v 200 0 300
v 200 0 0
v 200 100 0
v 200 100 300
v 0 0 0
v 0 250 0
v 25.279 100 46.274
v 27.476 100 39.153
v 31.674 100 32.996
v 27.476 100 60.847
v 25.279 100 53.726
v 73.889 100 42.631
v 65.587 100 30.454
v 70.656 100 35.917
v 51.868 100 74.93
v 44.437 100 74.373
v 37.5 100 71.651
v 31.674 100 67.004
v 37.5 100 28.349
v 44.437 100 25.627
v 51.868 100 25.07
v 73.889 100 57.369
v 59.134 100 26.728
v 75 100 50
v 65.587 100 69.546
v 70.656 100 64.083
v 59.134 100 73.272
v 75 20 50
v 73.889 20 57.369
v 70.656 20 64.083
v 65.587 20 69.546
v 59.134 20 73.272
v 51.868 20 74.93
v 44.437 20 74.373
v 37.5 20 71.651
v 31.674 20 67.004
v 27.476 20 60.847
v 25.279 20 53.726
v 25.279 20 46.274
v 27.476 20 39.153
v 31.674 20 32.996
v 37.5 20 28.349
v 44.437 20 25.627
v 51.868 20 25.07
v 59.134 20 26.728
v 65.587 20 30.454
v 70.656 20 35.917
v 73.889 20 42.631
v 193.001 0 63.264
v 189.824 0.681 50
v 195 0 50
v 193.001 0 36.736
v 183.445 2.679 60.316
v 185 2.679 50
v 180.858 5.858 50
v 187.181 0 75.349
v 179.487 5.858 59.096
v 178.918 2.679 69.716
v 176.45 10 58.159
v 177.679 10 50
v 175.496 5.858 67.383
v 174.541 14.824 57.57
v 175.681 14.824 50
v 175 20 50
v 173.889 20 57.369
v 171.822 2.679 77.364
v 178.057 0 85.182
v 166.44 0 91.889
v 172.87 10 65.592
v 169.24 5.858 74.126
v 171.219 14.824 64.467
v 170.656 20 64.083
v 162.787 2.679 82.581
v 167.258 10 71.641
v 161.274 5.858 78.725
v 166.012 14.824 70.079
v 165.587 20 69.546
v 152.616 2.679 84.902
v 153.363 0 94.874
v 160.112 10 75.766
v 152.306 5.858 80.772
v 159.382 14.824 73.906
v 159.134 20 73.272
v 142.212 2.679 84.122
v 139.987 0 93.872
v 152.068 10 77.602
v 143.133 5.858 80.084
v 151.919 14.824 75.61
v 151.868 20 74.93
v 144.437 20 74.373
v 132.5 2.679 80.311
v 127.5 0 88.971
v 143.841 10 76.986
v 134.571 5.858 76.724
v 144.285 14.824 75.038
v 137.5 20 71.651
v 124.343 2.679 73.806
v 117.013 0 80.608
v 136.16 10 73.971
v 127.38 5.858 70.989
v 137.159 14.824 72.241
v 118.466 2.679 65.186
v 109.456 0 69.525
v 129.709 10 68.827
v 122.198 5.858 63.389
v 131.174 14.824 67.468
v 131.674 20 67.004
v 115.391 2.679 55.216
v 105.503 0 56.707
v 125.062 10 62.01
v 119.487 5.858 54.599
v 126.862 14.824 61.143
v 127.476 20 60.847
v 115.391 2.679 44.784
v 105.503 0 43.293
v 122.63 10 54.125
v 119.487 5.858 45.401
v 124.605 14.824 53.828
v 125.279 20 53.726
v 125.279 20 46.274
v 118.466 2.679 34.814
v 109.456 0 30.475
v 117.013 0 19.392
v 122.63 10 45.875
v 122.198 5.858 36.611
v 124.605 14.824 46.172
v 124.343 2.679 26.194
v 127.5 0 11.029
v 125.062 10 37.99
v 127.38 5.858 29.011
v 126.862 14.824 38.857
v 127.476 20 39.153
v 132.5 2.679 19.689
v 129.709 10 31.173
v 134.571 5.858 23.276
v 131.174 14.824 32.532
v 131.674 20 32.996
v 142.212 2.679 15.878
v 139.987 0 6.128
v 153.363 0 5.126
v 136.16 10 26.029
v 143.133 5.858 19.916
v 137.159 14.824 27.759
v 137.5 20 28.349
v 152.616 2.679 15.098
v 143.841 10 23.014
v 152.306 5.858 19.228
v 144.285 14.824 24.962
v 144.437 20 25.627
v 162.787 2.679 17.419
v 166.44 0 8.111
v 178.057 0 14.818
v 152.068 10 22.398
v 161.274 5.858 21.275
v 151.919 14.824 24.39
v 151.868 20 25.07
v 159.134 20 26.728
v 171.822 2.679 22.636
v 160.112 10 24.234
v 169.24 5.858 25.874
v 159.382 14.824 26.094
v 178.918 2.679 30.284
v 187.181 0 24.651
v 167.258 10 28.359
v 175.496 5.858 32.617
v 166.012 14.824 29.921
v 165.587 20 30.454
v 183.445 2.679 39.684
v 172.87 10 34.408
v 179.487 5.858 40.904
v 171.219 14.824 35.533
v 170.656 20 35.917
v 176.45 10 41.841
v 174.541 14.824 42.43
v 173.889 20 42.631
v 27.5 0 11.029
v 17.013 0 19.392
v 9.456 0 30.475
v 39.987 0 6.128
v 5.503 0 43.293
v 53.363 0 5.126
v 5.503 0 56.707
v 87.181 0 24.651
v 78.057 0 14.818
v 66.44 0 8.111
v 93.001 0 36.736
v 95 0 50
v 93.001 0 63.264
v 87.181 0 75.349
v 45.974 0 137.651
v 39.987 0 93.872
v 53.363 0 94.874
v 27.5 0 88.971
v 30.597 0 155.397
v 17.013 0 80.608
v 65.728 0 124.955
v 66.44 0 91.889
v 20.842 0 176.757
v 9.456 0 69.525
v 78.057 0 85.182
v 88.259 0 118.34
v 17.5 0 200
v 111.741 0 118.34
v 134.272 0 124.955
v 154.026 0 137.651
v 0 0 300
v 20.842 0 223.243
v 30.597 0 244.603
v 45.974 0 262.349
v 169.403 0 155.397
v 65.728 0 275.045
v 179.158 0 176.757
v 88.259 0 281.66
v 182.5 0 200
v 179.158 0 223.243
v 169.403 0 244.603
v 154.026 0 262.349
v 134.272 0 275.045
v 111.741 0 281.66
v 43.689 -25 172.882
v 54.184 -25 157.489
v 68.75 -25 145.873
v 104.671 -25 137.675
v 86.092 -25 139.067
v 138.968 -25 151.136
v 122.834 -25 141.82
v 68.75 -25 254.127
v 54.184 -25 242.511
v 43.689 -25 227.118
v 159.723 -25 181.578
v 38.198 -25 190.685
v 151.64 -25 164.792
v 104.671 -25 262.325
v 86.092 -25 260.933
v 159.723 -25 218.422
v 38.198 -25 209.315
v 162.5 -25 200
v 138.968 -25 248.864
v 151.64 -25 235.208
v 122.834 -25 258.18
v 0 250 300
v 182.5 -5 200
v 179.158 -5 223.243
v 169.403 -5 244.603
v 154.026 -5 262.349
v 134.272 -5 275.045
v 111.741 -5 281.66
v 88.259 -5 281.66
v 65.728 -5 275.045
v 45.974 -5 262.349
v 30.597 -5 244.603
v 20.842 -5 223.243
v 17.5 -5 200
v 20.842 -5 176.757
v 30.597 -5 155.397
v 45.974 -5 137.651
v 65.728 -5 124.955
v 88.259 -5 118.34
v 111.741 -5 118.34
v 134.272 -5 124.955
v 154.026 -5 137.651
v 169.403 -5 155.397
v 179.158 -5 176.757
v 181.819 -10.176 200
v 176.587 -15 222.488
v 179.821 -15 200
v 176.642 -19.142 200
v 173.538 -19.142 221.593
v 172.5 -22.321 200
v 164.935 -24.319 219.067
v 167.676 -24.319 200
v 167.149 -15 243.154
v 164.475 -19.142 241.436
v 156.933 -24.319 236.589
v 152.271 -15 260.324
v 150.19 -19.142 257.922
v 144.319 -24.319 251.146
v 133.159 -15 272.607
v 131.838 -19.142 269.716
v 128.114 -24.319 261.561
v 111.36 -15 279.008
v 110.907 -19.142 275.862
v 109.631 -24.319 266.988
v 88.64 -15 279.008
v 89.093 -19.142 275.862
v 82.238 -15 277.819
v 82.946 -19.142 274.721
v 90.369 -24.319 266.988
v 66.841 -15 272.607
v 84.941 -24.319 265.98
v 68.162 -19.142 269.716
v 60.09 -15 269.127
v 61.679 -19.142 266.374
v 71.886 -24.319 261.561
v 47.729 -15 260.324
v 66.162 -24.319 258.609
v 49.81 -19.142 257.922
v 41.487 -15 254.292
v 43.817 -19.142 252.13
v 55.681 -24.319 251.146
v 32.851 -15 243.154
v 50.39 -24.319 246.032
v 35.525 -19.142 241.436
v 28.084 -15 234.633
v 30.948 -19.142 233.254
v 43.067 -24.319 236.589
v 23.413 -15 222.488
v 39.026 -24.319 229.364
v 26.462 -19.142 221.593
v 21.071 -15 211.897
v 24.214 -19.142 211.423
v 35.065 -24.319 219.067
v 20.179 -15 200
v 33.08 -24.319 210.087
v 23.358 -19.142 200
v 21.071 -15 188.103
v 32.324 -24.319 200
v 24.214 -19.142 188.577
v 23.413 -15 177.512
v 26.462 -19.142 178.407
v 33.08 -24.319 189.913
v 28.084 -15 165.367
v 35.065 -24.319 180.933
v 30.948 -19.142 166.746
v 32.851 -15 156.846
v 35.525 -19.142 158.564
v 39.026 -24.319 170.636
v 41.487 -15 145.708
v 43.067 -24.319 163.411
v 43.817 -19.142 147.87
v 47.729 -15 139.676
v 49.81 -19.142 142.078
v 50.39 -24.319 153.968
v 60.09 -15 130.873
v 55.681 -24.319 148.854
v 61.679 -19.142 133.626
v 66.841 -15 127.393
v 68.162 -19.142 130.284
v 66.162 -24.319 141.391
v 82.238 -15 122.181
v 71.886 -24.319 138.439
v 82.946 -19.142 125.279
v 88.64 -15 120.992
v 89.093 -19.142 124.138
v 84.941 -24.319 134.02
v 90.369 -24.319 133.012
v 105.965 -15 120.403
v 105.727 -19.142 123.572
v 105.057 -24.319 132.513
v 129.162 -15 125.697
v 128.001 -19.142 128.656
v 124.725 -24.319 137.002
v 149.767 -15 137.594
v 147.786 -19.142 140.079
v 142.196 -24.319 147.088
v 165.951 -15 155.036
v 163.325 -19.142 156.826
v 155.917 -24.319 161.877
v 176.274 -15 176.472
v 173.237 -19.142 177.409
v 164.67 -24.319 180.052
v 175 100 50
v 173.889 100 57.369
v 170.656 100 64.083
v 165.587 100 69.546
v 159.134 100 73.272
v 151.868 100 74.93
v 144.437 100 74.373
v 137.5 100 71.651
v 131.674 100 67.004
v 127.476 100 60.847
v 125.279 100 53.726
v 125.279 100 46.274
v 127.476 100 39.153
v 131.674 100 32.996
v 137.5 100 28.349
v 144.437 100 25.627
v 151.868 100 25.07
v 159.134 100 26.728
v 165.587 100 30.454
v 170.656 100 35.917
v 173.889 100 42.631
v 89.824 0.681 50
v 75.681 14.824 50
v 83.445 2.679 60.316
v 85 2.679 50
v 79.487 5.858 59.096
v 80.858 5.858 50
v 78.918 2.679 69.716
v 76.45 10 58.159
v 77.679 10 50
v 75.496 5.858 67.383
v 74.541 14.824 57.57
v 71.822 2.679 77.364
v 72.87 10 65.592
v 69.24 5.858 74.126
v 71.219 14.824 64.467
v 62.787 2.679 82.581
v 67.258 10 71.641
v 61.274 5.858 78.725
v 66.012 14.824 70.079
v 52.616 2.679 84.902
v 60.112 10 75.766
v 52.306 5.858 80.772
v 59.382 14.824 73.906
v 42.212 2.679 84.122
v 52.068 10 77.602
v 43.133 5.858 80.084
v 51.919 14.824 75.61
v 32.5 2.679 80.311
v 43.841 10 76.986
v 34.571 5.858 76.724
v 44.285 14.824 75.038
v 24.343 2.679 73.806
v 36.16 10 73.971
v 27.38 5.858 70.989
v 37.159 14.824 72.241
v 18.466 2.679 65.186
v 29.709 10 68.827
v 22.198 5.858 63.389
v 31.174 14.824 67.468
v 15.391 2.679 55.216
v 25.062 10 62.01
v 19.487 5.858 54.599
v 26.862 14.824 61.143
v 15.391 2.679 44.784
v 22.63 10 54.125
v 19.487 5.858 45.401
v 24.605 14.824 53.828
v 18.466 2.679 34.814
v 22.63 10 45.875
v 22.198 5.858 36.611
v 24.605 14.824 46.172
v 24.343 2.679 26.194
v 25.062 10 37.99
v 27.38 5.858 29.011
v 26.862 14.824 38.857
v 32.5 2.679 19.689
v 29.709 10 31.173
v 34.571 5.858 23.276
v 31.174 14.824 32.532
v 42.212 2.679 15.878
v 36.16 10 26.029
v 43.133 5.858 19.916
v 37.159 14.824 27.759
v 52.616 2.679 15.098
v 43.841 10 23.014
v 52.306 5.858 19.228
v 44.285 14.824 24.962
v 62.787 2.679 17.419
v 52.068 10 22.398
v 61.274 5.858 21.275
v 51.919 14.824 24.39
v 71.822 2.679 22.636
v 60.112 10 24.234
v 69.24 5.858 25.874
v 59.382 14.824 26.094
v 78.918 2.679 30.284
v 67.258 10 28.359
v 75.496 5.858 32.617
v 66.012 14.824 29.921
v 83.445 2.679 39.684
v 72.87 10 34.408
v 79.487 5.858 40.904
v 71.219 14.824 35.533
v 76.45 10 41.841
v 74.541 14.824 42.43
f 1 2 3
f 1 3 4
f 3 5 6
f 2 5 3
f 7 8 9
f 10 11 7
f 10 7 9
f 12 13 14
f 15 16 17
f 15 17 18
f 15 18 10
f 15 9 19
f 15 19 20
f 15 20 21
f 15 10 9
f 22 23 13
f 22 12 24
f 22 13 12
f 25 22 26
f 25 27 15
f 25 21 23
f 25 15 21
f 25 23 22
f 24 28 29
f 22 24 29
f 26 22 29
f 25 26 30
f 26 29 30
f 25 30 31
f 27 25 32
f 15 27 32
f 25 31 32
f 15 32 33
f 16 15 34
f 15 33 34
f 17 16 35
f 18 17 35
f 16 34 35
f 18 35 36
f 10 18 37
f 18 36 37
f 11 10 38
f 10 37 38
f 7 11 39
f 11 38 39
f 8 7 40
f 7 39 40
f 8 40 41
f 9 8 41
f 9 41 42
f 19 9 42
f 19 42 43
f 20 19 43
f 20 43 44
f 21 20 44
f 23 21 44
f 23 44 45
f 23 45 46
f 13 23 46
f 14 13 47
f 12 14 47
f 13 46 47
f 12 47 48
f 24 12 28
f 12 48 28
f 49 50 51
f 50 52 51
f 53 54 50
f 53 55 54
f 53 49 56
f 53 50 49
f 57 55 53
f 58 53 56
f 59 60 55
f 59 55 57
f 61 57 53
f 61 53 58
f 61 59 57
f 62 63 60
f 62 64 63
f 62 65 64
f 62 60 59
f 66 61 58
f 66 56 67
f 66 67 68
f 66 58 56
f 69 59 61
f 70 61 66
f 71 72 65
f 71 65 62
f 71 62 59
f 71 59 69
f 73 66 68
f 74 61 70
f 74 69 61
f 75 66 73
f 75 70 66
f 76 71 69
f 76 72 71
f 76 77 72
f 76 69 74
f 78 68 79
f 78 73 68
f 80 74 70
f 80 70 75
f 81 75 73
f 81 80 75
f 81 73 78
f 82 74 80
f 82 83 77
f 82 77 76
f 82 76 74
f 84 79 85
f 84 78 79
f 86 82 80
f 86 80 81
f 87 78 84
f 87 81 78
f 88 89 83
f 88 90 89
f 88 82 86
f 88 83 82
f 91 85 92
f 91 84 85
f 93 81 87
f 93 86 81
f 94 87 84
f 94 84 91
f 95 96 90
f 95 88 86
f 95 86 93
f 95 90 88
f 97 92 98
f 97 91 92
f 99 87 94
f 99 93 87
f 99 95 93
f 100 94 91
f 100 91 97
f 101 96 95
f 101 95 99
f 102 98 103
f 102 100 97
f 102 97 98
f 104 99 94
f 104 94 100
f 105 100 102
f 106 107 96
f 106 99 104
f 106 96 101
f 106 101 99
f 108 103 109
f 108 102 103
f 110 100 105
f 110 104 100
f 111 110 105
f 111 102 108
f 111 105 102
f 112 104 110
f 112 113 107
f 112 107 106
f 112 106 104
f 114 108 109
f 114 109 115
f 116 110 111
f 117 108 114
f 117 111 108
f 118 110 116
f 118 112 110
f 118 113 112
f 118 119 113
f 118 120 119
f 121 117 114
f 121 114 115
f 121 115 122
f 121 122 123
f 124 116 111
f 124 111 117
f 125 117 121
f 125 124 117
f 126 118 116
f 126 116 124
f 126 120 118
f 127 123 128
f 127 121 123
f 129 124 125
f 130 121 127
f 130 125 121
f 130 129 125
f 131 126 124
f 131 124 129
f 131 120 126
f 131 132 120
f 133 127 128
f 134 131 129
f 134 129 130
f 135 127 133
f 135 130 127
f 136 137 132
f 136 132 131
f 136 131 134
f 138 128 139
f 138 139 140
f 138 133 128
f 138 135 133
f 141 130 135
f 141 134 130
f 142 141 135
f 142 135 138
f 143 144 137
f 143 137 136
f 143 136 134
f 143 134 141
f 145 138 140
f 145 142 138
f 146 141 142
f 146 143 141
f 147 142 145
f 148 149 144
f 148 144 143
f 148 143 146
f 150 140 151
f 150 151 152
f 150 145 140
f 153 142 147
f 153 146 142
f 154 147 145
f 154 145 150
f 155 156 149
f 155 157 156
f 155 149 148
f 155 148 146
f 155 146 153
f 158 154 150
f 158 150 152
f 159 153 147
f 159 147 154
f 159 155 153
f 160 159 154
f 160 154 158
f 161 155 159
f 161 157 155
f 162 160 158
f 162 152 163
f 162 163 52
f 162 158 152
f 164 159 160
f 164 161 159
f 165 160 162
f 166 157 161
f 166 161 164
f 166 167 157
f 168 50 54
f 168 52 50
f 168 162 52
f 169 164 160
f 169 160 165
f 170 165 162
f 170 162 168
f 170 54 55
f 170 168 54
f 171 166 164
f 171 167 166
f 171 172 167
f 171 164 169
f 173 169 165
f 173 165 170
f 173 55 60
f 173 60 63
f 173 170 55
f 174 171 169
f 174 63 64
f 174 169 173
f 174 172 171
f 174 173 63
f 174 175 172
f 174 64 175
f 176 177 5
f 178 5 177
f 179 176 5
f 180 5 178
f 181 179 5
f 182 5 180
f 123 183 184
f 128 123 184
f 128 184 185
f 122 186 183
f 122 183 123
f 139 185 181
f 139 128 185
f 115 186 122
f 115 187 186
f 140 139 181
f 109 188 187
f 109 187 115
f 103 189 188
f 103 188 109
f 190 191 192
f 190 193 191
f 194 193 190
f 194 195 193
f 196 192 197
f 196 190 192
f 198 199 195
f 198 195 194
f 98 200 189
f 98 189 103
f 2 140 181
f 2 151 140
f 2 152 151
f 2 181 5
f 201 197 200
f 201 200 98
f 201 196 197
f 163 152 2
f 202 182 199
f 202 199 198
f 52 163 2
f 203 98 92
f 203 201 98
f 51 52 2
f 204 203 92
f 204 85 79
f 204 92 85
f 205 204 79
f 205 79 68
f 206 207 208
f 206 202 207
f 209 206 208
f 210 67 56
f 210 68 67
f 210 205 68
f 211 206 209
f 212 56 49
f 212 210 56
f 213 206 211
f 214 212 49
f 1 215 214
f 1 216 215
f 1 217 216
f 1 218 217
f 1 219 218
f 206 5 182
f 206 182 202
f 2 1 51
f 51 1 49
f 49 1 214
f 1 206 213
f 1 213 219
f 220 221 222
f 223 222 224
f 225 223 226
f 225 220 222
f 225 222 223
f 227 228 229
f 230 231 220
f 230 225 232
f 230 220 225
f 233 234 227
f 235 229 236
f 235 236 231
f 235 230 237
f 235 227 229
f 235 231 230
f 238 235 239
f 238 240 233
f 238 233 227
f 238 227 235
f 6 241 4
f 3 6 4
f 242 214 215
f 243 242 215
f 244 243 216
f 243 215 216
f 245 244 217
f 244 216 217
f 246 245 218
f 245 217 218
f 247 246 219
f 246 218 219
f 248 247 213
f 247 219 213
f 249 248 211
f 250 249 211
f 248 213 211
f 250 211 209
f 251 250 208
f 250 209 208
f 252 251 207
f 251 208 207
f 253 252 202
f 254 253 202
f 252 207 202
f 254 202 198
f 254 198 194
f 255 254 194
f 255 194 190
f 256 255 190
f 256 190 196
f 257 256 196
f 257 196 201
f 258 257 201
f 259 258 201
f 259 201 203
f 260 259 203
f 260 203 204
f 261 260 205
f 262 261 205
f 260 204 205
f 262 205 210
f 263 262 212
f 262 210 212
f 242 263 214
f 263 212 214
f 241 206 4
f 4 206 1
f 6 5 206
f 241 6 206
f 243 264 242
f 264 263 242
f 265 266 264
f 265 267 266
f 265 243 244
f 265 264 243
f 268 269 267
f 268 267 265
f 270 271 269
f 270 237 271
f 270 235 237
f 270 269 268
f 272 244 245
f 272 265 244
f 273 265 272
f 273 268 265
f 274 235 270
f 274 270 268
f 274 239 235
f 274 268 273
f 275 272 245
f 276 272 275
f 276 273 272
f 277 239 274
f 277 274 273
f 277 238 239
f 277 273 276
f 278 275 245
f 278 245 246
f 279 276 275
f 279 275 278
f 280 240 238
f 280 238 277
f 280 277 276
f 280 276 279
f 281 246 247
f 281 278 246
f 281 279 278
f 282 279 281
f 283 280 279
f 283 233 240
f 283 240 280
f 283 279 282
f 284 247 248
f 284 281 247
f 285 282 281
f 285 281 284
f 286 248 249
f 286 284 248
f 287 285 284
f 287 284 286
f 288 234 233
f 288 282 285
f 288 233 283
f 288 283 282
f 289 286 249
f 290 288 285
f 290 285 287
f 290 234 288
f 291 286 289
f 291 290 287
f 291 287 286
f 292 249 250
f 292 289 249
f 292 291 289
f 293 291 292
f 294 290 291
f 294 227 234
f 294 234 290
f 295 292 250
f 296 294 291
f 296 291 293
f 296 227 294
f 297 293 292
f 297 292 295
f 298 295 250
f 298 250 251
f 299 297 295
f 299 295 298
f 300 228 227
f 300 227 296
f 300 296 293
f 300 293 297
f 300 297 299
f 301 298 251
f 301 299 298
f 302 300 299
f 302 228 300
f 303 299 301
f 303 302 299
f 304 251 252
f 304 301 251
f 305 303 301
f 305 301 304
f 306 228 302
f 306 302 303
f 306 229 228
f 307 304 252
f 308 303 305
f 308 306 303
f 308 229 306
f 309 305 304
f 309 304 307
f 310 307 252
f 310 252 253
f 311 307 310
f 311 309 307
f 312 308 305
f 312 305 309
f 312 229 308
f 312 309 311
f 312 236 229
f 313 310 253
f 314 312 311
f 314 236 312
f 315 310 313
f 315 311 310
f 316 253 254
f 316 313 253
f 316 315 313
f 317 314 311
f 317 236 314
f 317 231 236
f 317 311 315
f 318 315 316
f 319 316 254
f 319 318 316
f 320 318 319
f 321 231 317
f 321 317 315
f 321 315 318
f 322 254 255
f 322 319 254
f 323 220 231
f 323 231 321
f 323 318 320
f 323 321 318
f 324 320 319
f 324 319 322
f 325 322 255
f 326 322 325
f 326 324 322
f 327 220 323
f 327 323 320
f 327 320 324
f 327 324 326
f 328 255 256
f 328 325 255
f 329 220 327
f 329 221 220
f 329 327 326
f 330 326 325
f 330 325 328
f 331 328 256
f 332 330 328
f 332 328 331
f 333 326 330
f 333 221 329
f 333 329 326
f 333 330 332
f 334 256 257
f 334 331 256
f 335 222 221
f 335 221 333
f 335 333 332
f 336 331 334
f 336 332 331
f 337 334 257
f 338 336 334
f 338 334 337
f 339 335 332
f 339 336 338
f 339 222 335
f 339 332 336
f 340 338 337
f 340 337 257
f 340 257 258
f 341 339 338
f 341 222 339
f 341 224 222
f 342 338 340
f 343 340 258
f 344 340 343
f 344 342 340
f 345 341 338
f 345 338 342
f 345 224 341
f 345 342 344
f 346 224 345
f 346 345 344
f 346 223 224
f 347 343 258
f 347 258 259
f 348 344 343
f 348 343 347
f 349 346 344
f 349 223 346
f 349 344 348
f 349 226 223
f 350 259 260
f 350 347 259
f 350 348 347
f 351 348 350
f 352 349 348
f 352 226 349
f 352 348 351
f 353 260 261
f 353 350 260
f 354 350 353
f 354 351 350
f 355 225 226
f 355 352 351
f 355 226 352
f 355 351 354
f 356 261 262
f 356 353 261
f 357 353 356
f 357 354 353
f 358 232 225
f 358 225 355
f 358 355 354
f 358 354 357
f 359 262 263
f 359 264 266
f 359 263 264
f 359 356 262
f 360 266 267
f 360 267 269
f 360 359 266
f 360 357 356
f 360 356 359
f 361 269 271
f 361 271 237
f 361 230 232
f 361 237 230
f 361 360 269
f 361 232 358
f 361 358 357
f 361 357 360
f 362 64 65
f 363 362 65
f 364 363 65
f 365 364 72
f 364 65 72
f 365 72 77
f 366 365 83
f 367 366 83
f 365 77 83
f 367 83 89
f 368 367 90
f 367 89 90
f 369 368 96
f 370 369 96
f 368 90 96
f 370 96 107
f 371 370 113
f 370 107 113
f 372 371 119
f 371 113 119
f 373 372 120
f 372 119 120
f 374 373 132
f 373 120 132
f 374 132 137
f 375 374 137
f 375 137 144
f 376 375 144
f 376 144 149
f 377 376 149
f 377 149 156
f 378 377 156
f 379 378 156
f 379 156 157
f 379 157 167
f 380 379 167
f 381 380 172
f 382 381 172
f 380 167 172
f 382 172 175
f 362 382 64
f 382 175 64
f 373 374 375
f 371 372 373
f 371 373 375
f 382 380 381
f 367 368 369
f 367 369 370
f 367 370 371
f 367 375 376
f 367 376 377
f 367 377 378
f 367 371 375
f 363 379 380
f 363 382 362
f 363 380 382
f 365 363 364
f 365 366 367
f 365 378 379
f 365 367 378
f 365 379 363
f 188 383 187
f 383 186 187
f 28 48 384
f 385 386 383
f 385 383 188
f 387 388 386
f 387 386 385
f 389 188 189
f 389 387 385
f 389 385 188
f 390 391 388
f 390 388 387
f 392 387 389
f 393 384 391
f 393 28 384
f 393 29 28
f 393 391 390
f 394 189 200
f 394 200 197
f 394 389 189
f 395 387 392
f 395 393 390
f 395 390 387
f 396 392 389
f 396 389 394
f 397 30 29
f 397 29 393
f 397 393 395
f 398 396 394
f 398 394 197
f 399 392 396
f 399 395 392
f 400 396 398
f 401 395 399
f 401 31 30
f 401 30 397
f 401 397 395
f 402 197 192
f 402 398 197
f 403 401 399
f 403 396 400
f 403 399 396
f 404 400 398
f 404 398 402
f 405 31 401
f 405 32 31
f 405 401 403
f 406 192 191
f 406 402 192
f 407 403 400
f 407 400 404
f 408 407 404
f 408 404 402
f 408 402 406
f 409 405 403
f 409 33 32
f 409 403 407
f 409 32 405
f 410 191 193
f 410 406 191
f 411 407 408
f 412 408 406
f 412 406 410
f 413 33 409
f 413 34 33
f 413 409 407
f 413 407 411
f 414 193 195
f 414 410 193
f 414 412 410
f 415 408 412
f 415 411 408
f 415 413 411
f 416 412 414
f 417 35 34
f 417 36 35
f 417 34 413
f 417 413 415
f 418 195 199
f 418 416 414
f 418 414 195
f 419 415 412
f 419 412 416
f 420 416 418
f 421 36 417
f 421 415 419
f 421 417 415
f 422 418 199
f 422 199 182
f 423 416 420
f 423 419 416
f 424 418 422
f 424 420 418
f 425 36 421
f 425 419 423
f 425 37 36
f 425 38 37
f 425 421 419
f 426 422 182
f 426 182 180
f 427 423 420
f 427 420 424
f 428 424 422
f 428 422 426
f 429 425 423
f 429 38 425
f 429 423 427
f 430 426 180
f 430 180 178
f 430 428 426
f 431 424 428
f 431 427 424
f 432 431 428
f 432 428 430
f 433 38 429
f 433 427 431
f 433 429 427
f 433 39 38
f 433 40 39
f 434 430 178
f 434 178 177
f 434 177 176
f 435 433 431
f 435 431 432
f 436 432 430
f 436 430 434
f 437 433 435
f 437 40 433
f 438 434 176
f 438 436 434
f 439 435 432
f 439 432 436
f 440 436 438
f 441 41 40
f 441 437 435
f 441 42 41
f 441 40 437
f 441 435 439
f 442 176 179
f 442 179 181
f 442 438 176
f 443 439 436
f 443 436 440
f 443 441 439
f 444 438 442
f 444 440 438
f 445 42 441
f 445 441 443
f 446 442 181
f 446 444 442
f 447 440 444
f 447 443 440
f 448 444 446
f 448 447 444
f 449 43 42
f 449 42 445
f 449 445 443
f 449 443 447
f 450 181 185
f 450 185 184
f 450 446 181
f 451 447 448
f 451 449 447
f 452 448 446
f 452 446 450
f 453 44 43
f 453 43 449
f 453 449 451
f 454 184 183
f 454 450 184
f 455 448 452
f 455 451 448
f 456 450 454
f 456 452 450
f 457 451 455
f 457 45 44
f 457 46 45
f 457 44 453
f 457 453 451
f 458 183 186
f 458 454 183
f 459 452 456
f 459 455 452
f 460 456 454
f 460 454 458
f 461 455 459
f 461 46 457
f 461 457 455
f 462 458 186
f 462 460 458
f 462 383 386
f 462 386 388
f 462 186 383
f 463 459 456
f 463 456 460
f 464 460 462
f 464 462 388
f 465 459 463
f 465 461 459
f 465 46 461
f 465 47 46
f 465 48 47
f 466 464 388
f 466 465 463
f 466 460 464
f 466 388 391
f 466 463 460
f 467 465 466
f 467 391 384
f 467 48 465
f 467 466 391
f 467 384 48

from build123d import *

# Parameters (mm, degrees)
F0_W     = 200
F0_H     = 300
F1_DEPTH = 250
F2_R     = 82.5
F3_DEPTH = 25
F5_DEPTH = 300.001
F6_R     = 25
F7_DEPTH = 100
F8_R     = 20


with BuildPart() as f1:
    # F0 (on Front) → F1 (new body)
    with BuildSketch(Plane.XZ):
        with Locations((100, 150)):
            Rectangle(F0_W, F0_H)
    extrude(amount=-F1_DEPTH)

    # F2 (on face) → F3 (join)
    with BuildSketch(Plane.XZ):
        with Locations((100, 200)):
            Circle(F2_R)
    extrude(amount=F3_DEPTH)

    # F4 (on face) → F5 (cut, through all)
    with BuildSketch(Plane.XY.offset(300)):
        Polygon((200, 250), (0, 250), (200, 100), align=None)
    extrude(amount=-F5_DEPTH, mode=Mode.SUBTRACT)

    # F6 (on face) → F7 (cut)
    with BuildSketch(Plane.XZ):
        with Locations((150, 50)):
            Circle(F6_R)
        with Locations((50, 50)):
            Circle(F6_R)
    extrude(amount=-F7_DEPTH, mode=Mode.SUBTRACT)

    # F8
    f8_edges = [f1.edges().sort_by_distance(p)[0] for p in [
        (25, 0, 50),
        (125, 0, 50),
        (17.5, -25, 200),
    ]]
    fillet(f8_edges, radius=F8_R)


solid = f1.part
